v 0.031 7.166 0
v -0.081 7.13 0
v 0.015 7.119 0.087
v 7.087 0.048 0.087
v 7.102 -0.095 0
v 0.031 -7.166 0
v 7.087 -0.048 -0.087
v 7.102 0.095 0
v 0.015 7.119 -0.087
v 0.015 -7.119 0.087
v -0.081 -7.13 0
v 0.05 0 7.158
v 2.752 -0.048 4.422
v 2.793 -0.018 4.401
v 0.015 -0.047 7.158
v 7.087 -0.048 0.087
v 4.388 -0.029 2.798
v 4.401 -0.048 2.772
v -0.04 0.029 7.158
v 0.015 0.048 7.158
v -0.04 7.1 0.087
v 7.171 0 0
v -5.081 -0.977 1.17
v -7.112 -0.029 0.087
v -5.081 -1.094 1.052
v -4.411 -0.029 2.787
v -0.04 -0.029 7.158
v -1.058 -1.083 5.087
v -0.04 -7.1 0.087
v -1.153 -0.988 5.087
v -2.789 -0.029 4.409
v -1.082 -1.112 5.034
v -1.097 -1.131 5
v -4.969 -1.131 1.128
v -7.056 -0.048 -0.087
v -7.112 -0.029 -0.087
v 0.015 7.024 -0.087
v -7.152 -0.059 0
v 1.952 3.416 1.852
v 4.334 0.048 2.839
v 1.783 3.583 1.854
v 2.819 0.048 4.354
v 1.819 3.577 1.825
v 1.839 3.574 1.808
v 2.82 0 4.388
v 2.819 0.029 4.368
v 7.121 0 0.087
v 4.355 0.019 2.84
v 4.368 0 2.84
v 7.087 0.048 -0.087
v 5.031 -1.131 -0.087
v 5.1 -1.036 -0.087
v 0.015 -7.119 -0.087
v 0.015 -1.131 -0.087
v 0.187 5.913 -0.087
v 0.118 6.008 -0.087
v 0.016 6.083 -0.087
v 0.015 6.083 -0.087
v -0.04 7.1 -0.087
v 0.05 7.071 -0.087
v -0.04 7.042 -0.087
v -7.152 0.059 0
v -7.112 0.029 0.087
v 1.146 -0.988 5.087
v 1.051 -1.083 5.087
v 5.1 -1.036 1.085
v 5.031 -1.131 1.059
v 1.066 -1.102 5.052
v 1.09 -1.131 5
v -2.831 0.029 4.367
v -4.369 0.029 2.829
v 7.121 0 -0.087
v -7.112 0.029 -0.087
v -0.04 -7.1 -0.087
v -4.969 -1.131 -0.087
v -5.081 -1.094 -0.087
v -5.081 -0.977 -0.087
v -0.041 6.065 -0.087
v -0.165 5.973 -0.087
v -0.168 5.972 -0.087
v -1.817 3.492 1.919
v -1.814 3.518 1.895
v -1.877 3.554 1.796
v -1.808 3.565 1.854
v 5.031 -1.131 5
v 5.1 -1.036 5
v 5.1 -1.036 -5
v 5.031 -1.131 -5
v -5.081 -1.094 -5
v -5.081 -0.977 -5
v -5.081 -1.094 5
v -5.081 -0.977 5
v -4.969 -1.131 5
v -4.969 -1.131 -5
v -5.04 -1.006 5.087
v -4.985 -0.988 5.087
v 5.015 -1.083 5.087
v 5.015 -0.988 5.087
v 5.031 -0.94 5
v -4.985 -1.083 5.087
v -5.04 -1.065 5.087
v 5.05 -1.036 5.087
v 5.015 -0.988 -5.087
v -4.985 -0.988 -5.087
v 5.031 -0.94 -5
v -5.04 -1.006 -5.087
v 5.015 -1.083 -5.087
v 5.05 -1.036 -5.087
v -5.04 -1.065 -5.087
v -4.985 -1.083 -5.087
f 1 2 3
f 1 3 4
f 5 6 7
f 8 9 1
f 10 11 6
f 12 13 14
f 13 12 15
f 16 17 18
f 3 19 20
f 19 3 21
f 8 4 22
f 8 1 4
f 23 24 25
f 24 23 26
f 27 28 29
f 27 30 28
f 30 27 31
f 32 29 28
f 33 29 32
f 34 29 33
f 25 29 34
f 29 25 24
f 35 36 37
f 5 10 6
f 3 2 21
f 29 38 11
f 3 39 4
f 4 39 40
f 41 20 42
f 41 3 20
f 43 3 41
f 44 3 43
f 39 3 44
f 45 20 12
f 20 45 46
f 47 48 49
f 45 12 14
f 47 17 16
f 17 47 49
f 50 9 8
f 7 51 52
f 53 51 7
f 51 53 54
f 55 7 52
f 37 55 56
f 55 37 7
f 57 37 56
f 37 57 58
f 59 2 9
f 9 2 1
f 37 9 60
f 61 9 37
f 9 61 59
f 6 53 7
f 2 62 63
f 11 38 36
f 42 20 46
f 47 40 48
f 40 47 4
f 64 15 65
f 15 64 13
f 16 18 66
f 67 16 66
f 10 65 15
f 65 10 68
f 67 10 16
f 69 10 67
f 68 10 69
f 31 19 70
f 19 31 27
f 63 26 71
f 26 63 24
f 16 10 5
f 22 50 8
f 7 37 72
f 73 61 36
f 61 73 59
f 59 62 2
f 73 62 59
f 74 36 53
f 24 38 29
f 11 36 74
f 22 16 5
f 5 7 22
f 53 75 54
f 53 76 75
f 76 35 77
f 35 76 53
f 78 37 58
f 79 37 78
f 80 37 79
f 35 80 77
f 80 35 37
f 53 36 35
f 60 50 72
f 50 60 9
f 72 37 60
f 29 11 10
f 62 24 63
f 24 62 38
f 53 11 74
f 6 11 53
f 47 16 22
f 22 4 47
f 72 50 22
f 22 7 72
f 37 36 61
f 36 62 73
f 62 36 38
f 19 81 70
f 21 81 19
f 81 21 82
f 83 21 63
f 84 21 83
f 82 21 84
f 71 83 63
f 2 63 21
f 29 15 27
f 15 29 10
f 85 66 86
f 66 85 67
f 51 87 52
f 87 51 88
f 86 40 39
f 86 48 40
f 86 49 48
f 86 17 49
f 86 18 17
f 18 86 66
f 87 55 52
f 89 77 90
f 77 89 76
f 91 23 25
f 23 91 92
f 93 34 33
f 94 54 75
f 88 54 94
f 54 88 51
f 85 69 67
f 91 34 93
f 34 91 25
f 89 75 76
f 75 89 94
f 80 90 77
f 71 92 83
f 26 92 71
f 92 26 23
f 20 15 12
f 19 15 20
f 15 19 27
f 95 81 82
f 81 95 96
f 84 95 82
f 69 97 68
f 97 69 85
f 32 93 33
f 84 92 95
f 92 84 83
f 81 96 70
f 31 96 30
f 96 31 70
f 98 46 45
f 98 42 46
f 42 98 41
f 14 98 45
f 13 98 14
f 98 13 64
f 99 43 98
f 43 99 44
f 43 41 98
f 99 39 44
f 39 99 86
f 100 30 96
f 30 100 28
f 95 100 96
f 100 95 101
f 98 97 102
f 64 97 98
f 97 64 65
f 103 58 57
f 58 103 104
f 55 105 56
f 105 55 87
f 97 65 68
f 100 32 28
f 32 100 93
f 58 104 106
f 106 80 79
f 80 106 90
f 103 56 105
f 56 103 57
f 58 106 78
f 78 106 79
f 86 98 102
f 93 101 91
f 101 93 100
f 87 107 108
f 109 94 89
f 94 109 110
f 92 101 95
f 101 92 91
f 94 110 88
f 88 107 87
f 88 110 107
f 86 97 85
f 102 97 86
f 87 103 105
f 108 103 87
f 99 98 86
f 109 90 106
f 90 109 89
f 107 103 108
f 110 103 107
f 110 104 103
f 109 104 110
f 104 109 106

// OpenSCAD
// Auto-generated OpenSCAD file

    inner_points = 10*[[0.499999999647243, -0.10355339109877267, -0.5000000000000022], [-0.5000000003527529, -0.10355339028132902, 0.5000000000000022], [-0.5000000003527572, -0.10355339028132601, -0.49999999999999795], [0.4999999996472473, -0.10355339109877568, 0.49999999999999795], [2.2526713020467915e-10, 0.6035533904964967, 2.128597539314253e-15]];

    outer_points = 10*[[0.7071067811865476, 0.0, -2.669135025276785e-09], [-0.7071067811865476, 0.0, 2.669135025276785e-09], [-2.6278612663574398e-14, 0.7071067811522772, -6.961725442369196e-06], [2.6278612663574398e-14, -0.7071067811522772, 6.961725442369196e-06], [2.6691350251474237e-09, 6.961725442369196e-06, 0.7071067811522772]];

    // Convex hull for inner set (I)
    module inner_hull() {
        hull() {
            for (p = inner_points) {
                translate(p) sphere(r=0.1);
            }
        }
    }

    // Convex hull for outer set (O) minus inner hull (O \ I)
    module outer_minus_inner() {
        difference() {
            hull() {
                for (p = outer_points) {
                    translate(p) sphere(r=0.1);
                }
            }
            inner_hull(); // Subtract inner hull
        }
    }

    // Convex hull for outer set (O) minus all translated inner hulls
    module outer_minus_AllTranslationInner() {
        difference() {
            hull() {
                for (p = outer_points) {
                    translate(p) sphere(r=0.1);
                }
            }
            hull() {
                translate([0,0,50]) inner_hull();
                translate([0,0,-50]) inner_hull();
            }; // Subtract translated inner hulls
        }
    }

    // Difference between outer_minus_inner and outer_minus_AllTranslationInner
    module outer_minus_inner_diff() {
        difference() {
            // Outer minus inner
            difference() {
                hull() {
                    for (p = outer_points) {
                        translate(p) sphere(r=0.1);
                    }
                }
                inner_hull();
            }

            // Subtract Outer minus AllTranslationInner
            difference() {
                hull() {
                    for (p = outer_points) {
                        translate(p) sphere(r=0.1);
                    }
                }
                hull() {
                    translate([0,0,50]) inner_hull();
                    translate([0,0,-50]) inner_hull();
                };
            }
        }
    }

    // Rendering all with colors applied
    color([1, 0, 0, 0.5]) inner_hull(); // Transparent red
    color([0, 1, 0, 1]) outer_minus_AllTranslationInner(); // Opaque green
    color([1, 1, 0, 1]) outer_minus_inner_diff(); // Opaque yellow
    
